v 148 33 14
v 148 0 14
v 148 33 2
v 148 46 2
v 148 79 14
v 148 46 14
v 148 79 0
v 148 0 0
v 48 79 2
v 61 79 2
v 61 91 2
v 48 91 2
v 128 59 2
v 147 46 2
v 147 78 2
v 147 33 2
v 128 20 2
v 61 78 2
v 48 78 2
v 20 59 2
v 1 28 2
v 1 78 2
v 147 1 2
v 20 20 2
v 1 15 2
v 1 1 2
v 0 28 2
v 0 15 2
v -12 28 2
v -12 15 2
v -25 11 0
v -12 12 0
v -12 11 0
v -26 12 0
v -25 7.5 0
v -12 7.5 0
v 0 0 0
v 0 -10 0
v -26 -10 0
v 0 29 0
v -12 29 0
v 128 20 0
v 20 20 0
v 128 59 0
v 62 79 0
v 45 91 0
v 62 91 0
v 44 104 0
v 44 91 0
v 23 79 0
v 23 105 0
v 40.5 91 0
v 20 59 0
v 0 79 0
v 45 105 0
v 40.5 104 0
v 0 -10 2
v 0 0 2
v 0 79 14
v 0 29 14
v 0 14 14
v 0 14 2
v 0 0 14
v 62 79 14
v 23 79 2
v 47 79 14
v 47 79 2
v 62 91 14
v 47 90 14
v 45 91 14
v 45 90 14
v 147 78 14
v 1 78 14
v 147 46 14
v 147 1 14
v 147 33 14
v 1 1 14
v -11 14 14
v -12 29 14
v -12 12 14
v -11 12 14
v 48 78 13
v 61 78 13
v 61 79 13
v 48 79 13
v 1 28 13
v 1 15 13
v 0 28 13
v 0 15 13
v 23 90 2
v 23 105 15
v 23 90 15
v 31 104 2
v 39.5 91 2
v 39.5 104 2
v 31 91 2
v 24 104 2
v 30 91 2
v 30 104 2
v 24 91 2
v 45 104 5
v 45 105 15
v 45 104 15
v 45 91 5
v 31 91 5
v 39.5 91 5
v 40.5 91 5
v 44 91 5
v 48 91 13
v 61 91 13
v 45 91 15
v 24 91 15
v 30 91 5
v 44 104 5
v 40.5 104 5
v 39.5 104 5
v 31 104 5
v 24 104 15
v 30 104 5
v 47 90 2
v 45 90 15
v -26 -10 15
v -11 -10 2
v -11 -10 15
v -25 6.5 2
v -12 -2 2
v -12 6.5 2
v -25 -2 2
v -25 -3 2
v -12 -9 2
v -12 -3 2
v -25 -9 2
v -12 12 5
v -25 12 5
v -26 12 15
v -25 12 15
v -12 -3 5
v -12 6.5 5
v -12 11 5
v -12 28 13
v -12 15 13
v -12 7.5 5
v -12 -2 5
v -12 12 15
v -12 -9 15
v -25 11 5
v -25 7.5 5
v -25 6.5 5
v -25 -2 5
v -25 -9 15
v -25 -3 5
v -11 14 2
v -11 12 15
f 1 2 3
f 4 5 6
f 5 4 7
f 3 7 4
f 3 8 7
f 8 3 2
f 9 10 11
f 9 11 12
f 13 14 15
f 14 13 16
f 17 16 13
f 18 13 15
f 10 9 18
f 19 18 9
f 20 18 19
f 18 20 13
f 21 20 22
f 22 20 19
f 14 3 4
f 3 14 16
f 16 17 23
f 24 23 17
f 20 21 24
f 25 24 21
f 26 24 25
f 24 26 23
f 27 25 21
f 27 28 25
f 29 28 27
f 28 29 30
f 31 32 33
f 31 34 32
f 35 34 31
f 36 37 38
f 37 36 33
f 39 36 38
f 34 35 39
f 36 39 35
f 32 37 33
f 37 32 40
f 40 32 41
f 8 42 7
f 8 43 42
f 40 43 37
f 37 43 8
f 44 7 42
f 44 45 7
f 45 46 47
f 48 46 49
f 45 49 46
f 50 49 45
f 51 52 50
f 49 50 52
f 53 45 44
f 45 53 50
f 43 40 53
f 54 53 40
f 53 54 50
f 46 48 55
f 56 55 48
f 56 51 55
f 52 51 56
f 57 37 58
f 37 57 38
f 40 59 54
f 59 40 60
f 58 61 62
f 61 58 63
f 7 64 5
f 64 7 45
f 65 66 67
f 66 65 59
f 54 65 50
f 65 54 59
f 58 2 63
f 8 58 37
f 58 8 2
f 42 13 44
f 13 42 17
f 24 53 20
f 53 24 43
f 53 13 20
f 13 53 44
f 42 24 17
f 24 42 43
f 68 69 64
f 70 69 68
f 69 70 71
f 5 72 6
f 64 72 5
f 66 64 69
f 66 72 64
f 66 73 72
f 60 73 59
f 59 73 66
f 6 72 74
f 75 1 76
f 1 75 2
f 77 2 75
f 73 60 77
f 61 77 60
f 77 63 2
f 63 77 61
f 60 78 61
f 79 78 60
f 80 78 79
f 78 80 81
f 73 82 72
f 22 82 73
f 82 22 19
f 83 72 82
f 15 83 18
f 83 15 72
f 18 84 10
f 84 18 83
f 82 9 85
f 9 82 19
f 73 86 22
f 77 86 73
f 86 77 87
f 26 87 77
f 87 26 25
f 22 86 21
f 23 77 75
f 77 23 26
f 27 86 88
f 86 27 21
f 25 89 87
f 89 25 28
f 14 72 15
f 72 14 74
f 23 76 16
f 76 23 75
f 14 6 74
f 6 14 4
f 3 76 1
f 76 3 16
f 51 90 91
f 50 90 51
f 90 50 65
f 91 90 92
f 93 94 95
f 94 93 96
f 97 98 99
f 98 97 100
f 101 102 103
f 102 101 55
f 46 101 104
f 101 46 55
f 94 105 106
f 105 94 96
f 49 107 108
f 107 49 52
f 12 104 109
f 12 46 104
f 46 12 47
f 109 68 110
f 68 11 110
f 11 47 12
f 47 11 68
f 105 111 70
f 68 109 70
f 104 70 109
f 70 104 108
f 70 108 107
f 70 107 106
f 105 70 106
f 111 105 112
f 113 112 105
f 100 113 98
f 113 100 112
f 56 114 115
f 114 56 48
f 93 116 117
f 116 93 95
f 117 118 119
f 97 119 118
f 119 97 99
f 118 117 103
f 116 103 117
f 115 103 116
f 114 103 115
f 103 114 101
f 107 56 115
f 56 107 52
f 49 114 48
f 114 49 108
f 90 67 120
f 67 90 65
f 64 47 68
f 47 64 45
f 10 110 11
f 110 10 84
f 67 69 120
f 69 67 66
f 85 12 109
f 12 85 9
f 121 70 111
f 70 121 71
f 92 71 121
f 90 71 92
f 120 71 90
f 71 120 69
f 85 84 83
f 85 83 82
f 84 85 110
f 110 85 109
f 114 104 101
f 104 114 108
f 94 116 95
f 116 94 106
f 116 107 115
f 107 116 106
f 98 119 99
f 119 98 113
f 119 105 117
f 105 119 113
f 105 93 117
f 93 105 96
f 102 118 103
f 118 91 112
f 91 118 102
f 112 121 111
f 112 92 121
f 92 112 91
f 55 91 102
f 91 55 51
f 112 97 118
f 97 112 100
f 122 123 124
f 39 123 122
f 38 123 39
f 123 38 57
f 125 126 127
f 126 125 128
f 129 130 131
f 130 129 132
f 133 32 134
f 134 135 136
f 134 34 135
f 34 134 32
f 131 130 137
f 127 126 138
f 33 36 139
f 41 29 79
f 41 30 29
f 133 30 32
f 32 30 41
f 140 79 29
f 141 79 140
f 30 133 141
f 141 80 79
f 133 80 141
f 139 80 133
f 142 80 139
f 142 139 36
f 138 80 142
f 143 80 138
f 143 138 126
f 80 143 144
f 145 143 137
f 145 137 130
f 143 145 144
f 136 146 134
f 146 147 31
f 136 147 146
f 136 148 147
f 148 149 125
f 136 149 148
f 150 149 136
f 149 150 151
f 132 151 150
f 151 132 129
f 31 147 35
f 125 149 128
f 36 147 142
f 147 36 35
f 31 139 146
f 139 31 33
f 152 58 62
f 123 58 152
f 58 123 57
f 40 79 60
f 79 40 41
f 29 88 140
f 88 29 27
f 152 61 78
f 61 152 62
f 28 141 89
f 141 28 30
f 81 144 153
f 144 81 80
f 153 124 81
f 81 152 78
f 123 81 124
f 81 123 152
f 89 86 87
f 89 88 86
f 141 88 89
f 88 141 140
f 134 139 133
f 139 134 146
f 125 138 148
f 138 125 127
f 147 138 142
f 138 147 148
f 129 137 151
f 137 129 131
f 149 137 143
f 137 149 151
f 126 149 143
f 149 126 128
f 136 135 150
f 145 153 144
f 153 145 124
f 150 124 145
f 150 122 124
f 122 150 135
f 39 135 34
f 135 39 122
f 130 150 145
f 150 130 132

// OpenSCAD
union() {
	// This frame is intended for a MX4 positioned with the
	// screen down, so that the rear camera is unobstructed

	// Device size is 144x75mm, but some padding is needed
        // Inner opening of 146x77 seems to work ok, but slightly loose
	// 1-146-1
	// |     |
	// 77    77
	// |     |
	// 1-146-1

	//base
	difference() {
		cube(size=[148,79,2]);
		translate([20,20,0])
			cube(size=[108,39,2]);
	}
	
	//left
	cube(size=[148,1,14]);
	//right
	difference() {
		translate([0,78,0])
			cube(size=[148,1,14]); // fill in the corner
		translate([48,78,0])
			cube(size=[13,1,14]); // cutout for voldown
	}
	//top
	difference() {
		translate([0, 1, 0])
			cube(size=[1,77,14]);
		translate([0,15,0])
			cube(size=[1,13,14]); // cutout for power button
	}
	//bottom
	difference() {
		translate([147,1,0])
			cube(size=[1,77,14]);
		translate([147,33,0])
			cube(size=[1,13,14]); // cutout for usb charging
	}
	//right side servo mount (volume down button)
	translate([62,79,0])
		rotate(180)
			servo_mount();
	//top side servo mount (power button)
	translate([0,29,0])
		rotate(-90)
			servo_mount();
	
}

module servo_mount() {
	// Start from edge of hole that is 13 wide,
	// the edge *opposite* the servo mount

	// This section makes the hole for the slider to 
	// push the button, thus everything is translated
	translate([0,-12,0]) {
		// short base to connect to servo mount
		cube(size=[39,12,2]);
		// slide sides
		cube(size=[1,12,14]);
		translate([14,0,0])
			cube(size=[1,12,14]);
		translate([15,0,0])
			cube(size=[2,1,14]);
		//top
		translate([0,0,13])
			cube(size=[15,13,1]);

		// This section is just the servo mount by itself
		//base
		difference() {
			translate([17,-13,0])
				cube(size=[22,13,2]);
			translate([18,-13,0])
				cube(size=[3.5,13,2]);
		}
		translate([17,-13,0])
			cube(size=[1,13,5]);
		translate([21.5,-13,0])
			cube(size=[1,13,5]);
		translate([31,-13,0])
			cube(size=[1,13,5]);
		//side walls
		translate([17,0,0])
			cube(size=[22,1,15]);
		translate([17,-14,0])
			cube(size=[22,1,15]);
		//back wall
		translate([38,-14,0])
			cube(size=[1,14,15]);
	}
}
